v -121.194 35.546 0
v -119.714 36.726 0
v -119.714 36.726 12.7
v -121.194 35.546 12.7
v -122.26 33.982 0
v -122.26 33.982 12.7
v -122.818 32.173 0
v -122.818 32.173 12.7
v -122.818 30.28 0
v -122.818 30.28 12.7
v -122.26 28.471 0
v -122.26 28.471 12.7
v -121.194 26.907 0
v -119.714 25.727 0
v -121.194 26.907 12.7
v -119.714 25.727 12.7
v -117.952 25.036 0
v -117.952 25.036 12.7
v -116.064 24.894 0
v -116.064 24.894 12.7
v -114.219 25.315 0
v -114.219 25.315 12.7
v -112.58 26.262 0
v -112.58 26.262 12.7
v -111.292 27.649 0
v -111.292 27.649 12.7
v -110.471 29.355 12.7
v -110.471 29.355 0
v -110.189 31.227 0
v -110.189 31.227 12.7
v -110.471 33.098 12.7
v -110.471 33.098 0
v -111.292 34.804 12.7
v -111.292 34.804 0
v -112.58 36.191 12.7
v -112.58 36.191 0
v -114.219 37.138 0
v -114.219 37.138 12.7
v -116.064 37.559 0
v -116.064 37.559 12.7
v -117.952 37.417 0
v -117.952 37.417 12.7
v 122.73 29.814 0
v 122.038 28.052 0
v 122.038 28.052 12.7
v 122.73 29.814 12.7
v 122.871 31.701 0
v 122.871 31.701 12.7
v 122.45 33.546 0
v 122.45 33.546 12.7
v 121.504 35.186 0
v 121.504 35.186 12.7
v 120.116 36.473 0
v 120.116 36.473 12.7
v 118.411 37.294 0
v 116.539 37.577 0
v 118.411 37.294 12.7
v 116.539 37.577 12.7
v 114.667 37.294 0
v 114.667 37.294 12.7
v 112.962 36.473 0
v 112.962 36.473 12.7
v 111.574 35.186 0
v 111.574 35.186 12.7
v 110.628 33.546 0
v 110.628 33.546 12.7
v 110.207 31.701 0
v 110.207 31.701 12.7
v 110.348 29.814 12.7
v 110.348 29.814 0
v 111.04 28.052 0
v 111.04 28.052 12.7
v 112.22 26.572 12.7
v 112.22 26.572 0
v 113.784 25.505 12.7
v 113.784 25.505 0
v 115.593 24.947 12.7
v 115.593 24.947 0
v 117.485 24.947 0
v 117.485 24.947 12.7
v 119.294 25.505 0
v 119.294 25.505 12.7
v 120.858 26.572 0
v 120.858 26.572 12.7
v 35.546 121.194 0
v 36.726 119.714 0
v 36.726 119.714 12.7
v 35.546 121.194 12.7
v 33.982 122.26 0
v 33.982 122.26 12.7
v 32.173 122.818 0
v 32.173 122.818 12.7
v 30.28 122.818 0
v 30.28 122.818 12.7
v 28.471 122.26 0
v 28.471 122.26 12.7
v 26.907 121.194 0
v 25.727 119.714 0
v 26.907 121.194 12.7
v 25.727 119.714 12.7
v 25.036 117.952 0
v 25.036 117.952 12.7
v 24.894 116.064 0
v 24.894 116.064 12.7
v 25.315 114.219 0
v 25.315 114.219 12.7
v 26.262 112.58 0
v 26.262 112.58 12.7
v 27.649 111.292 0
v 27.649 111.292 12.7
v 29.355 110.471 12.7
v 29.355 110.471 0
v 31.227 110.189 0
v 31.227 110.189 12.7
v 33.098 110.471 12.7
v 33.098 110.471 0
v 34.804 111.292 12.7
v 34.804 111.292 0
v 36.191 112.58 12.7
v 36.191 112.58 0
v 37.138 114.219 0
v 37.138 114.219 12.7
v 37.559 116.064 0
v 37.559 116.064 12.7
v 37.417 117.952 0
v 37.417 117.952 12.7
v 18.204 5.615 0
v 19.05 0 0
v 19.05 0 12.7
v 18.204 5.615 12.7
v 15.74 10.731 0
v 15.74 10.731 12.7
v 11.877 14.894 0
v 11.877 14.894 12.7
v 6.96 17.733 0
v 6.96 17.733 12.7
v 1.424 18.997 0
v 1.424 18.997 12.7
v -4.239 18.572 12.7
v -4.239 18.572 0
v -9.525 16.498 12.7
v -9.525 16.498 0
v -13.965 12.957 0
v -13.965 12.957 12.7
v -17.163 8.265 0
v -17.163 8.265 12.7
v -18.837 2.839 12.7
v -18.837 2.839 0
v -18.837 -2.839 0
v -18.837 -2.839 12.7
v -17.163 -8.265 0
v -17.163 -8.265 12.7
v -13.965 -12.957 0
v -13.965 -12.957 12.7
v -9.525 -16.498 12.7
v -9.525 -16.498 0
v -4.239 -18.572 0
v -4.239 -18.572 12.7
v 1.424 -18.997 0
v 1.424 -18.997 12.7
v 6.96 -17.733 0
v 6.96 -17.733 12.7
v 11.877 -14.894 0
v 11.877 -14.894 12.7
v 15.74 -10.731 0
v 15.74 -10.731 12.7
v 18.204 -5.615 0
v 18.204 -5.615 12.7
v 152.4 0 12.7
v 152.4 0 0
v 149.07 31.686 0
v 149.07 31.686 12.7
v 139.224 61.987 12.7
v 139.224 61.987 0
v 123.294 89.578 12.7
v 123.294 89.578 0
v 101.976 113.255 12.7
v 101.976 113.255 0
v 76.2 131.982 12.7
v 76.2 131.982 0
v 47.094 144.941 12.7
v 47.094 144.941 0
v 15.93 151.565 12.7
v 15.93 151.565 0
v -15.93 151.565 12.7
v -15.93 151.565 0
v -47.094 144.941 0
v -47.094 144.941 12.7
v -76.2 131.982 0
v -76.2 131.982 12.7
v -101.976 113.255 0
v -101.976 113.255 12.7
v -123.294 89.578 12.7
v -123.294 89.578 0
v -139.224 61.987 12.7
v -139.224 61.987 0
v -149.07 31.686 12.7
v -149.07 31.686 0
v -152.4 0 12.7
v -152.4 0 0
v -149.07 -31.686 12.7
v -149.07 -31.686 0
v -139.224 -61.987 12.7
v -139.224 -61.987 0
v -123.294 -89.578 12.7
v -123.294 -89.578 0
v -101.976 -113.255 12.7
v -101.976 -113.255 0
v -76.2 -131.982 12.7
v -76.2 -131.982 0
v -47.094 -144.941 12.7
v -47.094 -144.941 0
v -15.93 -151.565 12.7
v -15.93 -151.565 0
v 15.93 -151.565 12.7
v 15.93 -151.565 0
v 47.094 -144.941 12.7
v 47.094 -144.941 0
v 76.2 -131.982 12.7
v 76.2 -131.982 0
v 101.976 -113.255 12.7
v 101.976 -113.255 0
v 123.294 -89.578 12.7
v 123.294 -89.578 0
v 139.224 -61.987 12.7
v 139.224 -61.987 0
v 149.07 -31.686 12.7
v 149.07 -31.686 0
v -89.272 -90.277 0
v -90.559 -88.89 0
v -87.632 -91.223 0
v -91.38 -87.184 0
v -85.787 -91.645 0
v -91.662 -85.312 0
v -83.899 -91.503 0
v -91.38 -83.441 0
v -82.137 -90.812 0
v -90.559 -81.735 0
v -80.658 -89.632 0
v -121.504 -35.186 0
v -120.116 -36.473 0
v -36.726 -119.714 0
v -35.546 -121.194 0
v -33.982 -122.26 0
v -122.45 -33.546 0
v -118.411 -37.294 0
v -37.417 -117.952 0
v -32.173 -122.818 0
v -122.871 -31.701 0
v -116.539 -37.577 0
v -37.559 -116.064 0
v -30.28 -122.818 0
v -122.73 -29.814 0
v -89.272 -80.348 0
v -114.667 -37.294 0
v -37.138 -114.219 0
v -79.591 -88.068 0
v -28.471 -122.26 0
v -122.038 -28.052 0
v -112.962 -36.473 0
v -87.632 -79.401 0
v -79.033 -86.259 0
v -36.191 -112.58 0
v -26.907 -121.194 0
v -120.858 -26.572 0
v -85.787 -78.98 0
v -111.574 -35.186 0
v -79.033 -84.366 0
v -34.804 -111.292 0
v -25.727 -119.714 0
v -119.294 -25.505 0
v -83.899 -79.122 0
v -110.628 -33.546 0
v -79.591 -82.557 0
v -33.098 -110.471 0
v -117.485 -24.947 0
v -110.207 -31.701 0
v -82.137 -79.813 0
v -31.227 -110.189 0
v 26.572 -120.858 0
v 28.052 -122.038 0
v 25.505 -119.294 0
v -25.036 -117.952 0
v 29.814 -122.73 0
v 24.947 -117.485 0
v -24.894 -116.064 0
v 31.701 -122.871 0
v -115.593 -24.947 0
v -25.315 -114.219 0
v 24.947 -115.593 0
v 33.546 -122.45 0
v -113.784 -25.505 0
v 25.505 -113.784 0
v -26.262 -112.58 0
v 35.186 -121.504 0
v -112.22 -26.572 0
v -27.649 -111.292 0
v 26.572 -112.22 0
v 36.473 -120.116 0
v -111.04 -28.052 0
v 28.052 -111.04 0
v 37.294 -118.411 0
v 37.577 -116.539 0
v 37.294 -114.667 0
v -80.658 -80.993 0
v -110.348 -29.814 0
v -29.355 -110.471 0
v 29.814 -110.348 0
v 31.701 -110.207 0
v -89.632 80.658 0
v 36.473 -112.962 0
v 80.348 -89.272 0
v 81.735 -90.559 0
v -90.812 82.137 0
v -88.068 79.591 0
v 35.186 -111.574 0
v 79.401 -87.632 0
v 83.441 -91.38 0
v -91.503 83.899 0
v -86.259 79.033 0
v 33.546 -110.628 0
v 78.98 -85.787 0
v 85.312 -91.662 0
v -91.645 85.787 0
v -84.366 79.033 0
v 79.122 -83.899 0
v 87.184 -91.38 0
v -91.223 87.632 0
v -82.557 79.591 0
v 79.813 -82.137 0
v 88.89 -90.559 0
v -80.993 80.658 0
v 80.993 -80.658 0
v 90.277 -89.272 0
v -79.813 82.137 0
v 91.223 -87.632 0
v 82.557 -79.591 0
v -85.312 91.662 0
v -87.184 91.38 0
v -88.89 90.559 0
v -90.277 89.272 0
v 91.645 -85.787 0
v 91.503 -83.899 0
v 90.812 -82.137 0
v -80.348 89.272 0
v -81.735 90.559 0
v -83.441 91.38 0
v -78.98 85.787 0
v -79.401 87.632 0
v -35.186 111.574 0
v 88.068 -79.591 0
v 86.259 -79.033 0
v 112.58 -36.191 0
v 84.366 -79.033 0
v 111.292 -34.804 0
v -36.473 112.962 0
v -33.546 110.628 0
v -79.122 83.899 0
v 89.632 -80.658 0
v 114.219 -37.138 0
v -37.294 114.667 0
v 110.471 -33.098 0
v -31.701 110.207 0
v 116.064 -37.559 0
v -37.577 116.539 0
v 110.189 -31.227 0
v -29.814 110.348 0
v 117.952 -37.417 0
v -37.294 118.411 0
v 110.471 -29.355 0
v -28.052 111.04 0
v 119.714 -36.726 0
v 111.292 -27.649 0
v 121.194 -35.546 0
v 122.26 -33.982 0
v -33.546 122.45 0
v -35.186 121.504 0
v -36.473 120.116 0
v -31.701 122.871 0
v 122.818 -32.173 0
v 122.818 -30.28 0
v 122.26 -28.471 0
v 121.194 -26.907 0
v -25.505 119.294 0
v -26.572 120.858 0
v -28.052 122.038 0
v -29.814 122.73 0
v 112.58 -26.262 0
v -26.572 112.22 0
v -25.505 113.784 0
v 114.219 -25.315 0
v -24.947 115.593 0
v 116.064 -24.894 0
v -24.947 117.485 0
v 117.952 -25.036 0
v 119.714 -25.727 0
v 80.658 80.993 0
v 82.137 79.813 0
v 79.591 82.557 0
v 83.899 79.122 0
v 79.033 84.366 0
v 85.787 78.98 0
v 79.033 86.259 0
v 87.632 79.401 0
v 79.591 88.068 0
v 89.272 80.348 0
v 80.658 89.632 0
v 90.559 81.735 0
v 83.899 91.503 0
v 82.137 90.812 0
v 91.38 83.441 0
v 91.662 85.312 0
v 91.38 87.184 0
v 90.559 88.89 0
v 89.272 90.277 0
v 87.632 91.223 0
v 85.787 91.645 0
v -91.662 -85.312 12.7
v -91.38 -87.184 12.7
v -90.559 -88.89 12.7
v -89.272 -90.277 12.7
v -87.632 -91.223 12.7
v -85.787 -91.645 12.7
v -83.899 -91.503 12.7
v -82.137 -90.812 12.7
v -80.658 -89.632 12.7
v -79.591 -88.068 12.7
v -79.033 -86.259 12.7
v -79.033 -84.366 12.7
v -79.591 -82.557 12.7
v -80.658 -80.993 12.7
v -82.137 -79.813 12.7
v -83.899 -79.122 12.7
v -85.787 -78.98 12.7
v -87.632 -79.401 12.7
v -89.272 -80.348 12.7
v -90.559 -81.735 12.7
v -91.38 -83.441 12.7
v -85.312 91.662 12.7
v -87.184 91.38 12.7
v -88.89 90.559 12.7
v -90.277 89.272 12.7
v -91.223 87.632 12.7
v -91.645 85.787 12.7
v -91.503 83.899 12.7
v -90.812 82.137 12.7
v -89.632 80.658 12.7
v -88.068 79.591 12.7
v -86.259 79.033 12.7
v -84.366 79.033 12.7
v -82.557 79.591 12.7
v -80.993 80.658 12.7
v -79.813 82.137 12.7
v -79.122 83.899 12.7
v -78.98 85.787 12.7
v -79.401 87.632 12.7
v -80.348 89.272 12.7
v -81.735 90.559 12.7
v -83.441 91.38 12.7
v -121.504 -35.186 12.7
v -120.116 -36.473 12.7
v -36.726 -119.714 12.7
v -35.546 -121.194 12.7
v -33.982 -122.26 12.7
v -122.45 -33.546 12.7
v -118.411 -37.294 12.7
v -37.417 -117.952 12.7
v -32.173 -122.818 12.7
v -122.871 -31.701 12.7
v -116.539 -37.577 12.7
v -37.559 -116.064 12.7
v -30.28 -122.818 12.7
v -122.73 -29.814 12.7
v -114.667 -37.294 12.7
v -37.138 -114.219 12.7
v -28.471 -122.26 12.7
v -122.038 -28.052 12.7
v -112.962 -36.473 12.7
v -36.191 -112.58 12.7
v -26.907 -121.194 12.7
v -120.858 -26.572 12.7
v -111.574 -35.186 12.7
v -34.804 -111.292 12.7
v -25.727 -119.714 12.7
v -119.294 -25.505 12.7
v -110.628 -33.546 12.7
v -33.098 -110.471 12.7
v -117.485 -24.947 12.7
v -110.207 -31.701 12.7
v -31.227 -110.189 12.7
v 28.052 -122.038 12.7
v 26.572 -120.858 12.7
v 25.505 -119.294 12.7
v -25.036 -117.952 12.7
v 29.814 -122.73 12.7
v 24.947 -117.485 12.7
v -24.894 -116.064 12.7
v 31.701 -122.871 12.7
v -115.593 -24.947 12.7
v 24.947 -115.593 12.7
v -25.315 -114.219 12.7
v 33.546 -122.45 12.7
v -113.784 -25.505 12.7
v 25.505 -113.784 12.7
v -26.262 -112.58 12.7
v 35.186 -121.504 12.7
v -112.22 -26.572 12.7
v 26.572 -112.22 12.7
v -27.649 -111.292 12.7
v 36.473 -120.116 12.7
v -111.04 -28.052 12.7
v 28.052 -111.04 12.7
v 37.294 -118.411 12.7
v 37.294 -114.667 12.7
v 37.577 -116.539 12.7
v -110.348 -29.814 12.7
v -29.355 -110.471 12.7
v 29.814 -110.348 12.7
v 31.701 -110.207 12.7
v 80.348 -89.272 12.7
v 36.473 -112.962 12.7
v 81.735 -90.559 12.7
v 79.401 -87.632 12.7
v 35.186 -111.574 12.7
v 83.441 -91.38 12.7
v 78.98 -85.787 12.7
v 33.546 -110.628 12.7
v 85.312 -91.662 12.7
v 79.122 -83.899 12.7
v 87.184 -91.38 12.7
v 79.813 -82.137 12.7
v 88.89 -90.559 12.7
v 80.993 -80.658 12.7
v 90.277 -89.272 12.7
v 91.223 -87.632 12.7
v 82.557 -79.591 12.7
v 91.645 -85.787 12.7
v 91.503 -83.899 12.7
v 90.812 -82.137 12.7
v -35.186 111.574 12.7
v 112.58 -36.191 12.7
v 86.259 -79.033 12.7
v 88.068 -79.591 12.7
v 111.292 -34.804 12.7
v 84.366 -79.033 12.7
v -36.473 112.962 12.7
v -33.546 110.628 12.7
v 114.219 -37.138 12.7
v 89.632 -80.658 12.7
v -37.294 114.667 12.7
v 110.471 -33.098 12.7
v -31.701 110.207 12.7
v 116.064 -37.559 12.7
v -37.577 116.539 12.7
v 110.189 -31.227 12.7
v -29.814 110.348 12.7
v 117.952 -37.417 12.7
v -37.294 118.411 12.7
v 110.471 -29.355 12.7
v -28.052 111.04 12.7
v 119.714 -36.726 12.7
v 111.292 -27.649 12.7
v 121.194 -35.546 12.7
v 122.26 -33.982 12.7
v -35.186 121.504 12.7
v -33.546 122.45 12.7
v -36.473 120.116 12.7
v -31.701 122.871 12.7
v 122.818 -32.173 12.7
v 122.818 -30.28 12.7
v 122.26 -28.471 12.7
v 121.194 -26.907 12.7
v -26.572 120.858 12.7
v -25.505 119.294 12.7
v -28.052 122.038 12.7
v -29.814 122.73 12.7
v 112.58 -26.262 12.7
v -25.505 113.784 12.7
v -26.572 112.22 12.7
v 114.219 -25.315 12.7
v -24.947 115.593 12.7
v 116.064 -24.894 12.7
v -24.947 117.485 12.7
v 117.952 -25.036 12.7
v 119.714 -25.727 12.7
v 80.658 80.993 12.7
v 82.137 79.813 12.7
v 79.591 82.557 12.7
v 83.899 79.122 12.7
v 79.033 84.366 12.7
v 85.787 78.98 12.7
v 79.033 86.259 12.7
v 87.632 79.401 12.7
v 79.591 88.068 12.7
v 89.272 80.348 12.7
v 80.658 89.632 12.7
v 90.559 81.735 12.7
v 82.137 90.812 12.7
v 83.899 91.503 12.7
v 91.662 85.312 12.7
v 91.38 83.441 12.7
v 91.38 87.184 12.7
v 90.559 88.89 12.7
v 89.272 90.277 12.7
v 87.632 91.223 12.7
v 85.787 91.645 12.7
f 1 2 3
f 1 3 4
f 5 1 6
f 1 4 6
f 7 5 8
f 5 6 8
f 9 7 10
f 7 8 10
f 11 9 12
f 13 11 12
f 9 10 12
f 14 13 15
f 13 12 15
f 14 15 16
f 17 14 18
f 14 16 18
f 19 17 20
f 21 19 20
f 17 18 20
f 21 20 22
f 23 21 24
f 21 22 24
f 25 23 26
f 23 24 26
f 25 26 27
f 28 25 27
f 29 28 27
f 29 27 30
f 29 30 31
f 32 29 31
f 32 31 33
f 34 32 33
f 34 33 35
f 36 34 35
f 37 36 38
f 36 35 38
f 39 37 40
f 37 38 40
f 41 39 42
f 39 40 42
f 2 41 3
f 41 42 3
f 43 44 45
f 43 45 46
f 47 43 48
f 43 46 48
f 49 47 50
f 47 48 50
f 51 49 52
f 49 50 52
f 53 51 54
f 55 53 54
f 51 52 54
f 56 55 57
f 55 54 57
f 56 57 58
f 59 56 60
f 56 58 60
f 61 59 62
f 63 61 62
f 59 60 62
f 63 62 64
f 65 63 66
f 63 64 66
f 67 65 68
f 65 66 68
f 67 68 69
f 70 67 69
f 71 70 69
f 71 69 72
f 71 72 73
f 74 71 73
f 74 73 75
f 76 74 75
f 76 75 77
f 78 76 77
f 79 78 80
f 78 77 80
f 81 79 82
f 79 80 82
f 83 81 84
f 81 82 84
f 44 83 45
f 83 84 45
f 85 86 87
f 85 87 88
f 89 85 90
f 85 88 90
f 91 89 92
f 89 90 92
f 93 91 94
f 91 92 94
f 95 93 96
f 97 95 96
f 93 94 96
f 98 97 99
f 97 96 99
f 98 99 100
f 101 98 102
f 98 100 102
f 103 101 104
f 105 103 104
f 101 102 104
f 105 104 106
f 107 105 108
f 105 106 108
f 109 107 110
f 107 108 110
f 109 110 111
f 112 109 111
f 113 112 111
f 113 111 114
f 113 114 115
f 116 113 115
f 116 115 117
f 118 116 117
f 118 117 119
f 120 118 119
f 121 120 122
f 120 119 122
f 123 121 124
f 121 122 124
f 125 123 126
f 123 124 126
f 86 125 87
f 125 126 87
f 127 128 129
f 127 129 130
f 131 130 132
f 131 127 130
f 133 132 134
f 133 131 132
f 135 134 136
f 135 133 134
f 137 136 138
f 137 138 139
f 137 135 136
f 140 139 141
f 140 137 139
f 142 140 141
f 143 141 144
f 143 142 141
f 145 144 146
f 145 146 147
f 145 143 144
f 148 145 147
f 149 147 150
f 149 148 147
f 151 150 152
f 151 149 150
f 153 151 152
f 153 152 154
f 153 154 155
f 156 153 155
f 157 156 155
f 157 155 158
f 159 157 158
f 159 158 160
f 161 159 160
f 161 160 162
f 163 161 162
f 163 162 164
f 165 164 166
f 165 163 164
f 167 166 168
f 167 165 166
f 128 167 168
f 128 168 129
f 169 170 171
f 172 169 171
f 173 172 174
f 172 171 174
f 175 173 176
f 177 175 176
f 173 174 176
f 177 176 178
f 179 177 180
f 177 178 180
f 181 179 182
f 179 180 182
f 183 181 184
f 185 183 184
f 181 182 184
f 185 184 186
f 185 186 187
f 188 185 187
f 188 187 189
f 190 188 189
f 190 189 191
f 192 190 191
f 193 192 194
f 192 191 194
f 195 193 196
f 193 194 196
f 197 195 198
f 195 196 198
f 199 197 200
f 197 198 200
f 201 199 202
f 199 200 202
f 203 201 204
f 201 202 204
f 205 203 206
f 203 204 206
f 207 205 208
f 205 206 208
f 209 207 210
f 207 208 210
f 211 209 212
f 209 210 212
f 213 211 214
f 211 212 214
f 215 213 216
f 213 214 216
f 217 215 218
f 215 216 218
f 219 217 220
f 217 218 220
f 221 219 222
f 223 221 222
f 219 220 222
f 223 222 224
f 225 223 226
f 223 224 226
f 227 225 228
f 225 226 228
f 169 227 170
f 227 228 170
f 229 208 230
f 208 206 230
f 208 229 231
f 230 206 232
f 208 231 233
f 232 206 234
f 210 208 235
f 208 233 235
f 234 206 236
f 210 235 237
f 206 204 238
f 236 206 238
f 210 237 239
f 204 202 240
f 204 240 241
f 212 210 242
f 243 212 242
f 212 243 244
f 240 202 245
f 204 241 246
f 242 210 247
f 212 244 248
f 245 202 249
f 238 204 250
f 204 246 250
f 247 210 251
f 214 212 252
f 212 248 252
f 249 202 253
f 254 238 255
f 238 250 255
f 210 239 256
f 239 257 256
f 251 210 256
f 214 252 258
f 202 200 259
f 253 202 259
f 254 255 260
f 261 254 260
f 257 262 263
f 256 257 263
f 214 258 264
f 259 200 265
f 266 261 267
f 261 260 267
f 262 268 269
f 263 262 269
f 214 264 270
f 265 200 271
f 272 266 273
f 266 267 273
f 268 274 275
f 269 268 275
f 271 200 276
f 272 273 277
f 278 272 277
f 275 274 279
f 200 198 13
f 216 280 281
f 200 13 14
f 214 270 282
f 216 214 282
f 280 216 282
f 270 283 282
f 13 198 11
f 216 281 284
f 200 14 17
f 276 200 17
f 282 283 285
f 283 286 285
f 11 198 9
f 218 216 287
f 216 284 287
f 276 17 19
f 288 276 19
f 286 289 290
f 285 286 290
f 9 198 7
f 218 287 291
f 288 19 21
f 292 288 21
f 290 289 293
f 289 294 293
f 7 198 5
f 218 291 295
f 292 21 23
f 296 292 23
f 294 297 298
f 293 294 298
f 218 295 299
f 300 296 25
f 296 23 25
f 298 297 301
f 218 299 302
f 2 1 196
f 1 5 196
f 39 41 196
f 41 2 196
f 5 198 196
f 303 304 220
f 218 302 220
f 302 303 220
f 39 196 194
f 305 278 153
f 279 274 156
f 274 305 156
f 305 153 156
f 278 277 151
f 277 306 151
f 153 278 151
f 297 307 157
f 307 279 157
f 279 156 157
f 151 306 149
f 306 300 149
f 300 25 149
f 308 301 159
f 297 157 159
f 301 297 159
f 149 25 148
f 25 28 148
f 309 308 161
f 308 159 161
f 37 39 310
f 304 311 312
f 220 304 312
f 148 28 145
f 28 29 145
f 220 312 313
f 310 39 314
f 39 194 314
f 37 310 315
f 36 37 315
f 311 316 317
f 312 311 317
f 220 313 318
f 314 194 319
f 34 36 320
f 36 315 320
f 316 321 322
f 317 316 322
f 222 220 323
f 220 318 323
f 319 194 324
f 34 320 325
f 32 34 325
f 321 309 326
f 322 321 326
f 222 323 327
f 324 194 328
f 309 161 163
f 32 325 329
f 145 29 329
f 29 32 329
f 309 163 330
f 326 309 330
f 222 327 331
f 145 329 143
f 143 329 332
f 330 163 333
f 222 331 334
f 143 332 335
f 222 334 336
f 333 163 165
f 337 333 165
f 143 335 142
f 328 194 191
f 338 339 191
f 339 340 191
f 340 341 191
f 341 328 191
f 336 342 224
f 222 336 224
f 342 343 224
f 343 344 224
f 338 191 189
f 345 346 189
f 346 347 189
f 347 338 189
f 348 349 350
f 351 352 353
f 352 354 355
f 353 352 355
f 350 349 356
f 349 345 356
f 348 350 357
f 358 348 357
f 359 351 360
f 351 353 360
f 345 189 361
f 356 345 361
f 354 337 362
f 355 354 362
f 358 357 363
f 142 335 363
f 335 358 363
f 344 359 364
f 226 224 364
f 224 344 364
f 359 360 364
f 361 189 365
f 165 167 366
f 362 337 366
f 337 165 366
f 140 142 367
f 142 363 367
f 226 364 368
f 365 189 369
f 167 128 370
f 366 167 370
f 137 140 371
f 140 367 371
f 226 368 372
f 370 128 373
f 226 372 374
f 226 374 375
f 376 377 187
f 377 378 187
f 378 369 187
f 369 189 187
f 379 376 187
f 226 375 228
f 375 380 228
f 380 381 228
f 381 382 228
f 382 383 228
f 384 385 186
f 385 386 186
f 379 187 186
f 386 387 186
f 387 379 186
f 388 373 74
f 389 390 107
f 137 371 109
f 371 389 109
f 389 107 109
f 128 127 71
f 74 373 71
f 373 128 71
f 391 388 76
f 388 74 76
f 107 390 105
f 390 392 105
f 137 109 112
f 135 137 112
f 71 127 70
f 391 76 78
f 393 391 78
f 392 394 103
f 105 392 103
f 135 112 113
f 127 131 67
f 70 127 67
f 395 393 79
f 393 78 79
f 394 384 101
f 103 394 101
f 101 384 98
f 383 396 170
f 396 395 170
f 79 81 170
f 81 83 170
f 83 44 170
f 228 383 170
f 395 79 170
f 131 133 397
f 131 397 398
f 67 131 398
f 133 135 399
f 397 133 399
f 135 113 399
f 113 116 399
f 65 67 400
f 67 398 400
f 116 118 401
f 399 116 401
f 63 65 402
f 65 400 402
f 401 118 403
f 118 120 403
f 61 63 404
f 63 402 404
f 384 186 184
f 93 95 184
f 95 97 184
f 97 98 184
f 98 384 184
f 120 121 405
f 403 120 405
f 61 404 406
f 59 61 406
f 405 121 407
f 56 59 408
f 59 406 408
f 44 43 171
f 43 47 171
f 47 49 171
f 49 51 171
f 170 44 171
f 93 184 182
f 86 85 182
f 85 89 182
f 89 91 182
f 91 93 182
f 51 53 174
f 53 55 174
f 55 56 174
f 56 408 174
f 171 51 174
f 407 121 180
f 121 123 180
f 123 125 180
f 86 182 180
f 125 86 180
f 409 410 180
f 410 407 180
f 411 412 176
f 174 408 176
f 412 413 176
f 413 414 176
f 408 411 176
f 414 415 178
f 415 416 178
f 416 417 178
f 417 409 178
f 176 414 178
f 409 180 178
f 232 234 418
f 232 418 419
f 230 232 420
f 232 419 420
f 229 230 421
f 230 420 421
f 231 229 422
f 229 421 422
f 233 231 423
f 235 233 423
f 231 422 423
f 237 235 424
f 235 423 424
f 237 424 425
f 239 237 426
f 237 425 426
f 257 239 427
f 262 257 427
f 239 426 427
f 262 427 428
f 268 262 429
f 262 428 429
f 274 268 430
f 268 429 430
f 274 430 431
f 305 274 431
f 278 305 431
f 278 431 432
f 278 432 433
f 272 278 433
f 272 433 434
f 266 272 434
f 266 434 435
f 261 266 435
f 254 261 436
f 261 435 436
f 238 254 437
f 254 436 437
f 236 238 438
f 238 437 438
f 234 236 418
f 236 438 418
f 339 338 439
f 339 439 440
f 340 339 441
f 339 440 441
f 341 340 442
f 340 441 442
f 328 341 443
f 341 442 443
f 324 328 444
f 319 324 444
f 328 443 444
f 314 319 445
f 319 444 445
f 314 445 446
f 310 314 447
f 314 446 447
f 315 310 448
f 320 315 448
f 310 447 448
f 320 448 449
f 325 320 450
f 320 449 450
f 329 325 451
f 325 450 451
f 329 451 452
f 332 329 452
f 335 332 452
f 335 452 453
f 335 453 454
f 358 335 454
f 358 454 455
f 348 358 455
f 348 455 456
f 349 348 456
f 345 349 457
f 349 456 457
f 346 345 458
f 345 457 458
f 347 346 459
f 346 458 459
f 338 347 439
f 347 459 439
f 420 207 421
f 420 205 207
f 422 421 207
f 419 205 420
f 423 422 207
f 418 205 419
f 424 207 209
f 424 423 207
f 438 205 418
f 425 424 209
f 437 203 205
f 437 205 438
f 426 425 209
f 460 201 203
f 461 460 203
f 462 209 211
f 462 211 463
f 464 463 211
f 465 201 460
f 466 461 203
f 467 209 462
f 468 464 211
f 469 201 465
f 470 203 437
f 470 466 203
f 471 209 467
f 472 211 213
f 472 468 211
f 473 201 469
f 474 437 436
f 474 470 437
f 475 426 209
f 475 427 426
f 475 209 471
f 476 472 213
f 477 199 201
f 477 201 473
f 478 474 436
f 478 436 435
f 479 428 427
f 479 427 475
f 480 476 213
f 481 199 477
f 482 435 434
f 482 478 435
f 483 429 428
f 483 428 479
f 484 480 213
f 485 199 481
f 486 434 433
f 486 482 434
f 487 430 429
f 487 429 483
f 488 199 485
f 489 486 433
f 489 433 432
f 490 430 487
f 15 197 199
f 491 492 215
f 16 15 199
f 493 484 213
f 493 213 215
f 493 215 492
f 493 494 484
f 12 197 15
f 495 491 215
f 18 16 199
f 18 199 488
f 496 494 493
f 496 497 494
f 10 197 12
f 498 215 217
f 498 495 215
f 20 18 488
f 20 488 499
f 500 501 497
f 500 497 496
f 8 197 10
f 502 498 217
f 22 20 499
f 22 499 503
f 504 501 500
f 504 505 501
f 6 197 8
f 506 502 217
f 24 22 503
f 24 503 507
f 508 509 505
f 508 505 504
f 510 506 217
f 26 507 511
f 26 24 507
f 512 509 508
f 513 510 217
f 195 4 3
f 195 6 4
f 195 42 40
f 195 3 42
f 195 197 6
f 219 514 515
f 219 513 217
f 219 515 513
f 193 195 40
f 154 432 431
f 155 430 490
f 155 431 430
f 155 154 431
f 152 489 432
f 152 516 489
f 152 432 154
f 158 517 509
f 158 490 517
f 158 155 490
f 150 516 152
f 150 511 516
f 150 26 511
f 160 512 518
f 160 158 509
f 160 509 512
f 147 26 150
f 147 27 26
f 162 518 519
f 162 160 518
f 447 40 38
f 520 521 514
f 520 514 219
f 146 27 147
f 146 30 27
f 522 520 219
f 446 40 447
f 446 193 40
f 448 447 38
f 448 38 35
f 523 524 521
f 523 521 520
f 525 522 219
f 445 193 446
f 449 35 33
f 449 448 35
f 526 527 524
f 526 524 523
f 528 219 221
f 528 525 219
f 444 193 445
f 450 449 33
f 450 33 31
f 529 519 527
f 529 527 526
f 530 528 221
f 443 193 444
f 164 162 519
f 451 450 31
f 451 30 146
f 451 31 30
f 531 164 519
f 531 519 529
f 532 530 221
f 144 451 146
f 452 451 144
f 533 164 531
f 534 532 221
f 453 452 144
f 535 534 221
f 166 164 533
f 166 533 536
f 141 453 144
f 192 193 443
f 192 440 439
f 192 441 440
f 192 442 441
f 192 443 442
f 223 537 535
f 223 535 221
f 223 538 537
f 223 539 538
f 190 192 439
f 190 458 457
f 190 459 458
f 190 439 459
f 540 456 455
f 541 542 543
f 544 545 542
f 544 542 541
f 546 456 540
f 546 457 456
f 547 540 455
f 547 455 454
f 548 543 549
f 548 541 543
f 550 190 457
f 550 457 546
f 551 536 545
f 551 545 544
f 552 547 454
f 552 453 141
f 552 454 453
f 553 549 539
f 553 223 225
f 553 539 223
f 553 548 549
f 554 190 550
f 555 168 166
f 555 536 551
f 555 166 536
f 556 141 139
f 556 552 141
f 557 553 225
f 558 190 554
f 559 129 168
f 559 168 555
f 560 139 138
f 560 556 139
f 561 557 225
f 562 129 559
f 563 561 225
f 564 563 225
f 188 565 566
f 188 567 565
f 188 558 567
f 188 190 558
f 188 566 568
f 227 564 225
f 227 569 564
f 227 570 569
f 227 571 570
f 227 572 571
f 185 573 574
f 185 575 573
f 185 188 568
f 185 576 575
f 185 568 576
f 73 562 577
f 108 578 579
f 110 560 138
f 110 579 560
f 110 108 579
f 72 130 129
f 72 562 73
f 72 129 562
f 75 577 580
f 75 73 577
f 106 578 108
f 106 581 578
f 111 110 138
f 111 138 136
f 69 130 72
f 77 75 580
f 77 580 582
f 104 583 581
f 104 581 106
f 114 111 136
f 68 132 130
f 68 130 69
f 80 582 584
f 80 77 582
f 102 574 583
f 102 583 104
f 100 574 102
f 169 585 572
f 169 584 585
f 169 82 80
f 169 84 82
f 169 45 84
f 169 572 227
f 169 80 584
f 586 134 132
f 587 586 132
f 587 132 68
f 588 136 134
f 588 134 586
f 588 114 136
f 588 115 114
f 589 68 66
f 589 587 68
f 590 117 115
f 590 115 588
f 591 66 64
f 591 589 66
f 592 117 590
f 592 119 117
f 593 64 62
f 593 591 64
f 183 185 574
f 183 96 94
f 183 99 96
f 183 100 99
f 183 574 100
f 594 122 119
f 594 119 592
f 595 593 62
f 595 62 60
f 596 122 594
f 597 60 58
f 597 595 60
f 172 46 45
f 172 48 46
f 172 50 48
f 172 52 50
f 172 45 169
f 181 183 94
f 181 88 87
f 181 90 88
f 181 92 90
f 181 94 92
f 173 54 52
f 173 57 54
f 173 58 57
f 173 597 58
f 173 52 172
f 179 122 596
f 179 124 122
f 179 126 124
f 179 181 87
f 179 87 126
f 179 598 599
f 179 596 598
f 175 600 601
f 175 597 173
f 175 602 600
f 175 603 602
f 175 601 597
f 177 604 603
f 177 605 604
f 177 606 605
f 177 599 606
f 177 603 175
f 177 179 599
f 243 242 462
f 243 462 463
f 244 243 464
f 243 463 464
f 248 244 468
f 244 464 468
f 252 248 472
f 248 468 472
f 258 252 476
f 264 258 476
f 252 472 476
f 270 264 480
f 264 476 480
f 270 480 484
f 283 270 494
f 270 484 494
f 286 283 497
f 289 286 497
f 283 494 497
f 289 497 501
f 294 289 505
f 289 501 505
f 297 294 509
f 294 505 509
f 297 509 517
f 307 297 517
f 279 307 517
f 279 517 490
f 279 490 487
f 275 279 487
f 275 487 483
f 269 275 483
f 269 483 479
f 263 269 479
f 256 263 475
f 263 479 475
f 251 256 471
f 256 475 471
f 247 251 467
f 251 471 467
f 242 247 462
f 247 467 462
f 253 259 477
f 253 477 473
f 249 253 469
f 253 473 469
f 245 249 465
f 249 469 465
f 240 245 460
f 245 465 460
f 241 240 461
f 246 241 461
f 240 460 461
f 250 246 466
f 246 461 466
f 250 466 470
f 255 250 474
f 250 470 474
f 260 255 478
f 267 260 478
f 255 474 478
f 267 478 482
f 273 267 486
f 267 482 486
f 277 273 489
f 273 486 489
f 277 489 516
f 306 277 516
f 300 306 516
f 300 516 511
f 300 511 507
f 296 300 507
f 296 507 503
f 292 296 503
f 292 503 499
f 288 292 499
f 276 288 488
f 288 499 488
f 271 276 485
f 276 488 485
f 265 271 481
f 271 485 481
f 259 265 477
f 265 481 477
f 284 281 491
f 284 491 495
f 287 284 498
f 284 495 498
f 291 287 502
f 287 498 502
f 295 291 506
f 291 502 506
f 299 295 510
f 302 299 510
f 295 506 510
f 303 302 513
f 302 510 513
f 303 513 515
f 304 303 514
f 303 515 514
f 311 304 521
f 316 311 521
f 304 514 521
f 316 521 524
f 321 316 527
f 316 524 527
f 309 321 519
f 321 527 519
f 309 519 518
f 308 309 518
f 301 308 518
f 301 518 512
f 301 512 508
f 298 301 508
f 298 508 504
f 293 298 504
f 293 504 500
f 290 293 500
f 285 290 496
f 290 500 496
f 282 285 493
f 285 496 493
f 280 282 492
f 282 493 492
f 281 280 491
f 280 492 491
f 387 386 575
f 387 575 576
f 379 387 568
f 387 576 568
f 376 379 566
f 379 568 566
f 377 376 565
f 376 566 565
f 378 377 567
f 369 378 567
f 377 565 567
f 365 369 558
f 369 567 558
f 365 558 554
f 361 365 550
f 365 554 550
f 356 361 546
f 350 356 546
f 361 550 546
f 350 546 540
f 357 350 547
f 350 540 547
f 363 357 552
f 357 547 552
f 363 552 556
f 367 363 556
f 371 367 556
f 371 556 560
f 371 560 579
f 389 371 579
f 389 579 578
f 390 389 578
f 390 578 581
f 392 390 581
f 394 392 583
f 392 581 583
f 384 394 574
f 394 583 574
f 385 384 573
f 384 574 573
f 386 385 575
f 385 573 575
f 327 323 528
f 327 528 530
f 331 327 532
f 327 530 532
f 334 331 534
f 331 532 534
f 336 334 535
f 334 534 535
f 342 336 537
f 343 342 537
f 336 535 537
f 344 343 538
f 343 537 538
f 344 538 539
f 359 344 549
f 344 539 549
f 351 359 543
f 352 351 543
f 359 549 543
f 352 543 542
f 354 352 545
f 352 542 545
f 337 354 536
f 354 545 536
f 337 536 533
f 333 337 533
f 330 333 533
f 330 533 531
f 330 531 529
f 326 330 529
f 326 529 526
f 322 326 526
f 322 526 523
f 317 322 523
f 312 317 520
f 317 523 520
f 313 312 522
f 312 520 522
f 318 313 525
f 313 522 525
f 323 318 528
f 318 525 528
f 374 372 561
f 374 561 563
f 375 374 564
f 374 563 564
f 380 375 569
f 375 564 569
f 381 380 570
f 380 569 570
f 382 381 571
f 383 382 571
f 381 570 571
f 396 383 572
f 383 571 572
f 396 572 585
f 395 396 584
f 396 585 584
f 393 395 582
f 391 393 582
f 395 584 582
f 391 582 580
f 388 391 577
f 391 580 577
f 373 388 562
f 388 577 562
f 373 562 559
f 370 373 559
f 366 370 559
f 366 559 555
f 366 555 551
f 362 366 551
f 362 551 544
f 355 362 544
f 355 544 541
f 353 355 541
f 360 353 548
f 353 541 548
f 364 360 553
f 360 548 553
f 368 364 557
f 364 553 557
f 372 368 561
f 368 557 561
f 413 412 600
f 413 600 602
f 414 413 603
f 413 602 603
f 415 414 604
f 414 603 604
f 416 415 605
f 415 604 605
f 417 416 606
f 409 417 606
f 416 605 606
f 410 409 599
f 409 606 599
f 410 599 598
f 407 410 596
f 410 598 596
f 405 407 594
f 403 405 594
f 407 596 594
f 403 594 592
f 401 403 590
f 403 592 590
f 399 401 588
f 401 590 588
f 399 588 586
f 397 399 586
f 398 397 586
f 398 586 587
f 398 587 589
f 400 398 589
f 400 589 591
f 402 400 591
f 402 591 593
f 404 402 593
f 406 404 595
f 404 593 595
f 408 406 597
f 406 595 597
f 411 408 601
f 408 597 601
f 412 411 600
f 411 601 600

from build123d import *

# Parameters (mm, degrees)
SKETCH1_R           = 152.4
SKETCH1_R_2         = 19.05
BOSS_EXTRUDE1_DEPTH = 12.7
SKETCH2_R           = 6.35
CUT_EXTRUDE2_DEPTH  = 216.9
CRVPATTERN1_COUNT   = 12


with BuildPart() as part:
    # Sketch1 → Boss-Extrude1 (new body)
    with BuildSketch(Plane.XY):
        Circle(SKETCH1_R)
        Circle(SKETCH1_R_2, mode=Mode.SUBTRACT)
    extrude(amount=BOSS_EXTRUDE1_DEPTH)

    # Sketch2 → Cut-Extrude2 (cut, symmetric)
    with BuildSketch(Plane.XY):
        with Locations((85.31243315, 85.31243315)):
            Circle(SKETCH2_R)
    cut_extrude2 = extrude(amount=CUT_EXTRUDE2_DEPTH, both=True, mode=Mode.SUBTRACT)

    # CrvPattern1: Cut-Extrude2 ×12 about axis
    crvpattern1_axis = Axis((0, 0, 0), (0, 0, 1))
    for i in range(1, CRVPATTERN1_COUNT):
        add(cut_extrude2.rotate(crvpattern1_axis, i * 360 / CRVPATTERN1_COUNT), mode=Mode.SUBTRACT)


solid = part.part
